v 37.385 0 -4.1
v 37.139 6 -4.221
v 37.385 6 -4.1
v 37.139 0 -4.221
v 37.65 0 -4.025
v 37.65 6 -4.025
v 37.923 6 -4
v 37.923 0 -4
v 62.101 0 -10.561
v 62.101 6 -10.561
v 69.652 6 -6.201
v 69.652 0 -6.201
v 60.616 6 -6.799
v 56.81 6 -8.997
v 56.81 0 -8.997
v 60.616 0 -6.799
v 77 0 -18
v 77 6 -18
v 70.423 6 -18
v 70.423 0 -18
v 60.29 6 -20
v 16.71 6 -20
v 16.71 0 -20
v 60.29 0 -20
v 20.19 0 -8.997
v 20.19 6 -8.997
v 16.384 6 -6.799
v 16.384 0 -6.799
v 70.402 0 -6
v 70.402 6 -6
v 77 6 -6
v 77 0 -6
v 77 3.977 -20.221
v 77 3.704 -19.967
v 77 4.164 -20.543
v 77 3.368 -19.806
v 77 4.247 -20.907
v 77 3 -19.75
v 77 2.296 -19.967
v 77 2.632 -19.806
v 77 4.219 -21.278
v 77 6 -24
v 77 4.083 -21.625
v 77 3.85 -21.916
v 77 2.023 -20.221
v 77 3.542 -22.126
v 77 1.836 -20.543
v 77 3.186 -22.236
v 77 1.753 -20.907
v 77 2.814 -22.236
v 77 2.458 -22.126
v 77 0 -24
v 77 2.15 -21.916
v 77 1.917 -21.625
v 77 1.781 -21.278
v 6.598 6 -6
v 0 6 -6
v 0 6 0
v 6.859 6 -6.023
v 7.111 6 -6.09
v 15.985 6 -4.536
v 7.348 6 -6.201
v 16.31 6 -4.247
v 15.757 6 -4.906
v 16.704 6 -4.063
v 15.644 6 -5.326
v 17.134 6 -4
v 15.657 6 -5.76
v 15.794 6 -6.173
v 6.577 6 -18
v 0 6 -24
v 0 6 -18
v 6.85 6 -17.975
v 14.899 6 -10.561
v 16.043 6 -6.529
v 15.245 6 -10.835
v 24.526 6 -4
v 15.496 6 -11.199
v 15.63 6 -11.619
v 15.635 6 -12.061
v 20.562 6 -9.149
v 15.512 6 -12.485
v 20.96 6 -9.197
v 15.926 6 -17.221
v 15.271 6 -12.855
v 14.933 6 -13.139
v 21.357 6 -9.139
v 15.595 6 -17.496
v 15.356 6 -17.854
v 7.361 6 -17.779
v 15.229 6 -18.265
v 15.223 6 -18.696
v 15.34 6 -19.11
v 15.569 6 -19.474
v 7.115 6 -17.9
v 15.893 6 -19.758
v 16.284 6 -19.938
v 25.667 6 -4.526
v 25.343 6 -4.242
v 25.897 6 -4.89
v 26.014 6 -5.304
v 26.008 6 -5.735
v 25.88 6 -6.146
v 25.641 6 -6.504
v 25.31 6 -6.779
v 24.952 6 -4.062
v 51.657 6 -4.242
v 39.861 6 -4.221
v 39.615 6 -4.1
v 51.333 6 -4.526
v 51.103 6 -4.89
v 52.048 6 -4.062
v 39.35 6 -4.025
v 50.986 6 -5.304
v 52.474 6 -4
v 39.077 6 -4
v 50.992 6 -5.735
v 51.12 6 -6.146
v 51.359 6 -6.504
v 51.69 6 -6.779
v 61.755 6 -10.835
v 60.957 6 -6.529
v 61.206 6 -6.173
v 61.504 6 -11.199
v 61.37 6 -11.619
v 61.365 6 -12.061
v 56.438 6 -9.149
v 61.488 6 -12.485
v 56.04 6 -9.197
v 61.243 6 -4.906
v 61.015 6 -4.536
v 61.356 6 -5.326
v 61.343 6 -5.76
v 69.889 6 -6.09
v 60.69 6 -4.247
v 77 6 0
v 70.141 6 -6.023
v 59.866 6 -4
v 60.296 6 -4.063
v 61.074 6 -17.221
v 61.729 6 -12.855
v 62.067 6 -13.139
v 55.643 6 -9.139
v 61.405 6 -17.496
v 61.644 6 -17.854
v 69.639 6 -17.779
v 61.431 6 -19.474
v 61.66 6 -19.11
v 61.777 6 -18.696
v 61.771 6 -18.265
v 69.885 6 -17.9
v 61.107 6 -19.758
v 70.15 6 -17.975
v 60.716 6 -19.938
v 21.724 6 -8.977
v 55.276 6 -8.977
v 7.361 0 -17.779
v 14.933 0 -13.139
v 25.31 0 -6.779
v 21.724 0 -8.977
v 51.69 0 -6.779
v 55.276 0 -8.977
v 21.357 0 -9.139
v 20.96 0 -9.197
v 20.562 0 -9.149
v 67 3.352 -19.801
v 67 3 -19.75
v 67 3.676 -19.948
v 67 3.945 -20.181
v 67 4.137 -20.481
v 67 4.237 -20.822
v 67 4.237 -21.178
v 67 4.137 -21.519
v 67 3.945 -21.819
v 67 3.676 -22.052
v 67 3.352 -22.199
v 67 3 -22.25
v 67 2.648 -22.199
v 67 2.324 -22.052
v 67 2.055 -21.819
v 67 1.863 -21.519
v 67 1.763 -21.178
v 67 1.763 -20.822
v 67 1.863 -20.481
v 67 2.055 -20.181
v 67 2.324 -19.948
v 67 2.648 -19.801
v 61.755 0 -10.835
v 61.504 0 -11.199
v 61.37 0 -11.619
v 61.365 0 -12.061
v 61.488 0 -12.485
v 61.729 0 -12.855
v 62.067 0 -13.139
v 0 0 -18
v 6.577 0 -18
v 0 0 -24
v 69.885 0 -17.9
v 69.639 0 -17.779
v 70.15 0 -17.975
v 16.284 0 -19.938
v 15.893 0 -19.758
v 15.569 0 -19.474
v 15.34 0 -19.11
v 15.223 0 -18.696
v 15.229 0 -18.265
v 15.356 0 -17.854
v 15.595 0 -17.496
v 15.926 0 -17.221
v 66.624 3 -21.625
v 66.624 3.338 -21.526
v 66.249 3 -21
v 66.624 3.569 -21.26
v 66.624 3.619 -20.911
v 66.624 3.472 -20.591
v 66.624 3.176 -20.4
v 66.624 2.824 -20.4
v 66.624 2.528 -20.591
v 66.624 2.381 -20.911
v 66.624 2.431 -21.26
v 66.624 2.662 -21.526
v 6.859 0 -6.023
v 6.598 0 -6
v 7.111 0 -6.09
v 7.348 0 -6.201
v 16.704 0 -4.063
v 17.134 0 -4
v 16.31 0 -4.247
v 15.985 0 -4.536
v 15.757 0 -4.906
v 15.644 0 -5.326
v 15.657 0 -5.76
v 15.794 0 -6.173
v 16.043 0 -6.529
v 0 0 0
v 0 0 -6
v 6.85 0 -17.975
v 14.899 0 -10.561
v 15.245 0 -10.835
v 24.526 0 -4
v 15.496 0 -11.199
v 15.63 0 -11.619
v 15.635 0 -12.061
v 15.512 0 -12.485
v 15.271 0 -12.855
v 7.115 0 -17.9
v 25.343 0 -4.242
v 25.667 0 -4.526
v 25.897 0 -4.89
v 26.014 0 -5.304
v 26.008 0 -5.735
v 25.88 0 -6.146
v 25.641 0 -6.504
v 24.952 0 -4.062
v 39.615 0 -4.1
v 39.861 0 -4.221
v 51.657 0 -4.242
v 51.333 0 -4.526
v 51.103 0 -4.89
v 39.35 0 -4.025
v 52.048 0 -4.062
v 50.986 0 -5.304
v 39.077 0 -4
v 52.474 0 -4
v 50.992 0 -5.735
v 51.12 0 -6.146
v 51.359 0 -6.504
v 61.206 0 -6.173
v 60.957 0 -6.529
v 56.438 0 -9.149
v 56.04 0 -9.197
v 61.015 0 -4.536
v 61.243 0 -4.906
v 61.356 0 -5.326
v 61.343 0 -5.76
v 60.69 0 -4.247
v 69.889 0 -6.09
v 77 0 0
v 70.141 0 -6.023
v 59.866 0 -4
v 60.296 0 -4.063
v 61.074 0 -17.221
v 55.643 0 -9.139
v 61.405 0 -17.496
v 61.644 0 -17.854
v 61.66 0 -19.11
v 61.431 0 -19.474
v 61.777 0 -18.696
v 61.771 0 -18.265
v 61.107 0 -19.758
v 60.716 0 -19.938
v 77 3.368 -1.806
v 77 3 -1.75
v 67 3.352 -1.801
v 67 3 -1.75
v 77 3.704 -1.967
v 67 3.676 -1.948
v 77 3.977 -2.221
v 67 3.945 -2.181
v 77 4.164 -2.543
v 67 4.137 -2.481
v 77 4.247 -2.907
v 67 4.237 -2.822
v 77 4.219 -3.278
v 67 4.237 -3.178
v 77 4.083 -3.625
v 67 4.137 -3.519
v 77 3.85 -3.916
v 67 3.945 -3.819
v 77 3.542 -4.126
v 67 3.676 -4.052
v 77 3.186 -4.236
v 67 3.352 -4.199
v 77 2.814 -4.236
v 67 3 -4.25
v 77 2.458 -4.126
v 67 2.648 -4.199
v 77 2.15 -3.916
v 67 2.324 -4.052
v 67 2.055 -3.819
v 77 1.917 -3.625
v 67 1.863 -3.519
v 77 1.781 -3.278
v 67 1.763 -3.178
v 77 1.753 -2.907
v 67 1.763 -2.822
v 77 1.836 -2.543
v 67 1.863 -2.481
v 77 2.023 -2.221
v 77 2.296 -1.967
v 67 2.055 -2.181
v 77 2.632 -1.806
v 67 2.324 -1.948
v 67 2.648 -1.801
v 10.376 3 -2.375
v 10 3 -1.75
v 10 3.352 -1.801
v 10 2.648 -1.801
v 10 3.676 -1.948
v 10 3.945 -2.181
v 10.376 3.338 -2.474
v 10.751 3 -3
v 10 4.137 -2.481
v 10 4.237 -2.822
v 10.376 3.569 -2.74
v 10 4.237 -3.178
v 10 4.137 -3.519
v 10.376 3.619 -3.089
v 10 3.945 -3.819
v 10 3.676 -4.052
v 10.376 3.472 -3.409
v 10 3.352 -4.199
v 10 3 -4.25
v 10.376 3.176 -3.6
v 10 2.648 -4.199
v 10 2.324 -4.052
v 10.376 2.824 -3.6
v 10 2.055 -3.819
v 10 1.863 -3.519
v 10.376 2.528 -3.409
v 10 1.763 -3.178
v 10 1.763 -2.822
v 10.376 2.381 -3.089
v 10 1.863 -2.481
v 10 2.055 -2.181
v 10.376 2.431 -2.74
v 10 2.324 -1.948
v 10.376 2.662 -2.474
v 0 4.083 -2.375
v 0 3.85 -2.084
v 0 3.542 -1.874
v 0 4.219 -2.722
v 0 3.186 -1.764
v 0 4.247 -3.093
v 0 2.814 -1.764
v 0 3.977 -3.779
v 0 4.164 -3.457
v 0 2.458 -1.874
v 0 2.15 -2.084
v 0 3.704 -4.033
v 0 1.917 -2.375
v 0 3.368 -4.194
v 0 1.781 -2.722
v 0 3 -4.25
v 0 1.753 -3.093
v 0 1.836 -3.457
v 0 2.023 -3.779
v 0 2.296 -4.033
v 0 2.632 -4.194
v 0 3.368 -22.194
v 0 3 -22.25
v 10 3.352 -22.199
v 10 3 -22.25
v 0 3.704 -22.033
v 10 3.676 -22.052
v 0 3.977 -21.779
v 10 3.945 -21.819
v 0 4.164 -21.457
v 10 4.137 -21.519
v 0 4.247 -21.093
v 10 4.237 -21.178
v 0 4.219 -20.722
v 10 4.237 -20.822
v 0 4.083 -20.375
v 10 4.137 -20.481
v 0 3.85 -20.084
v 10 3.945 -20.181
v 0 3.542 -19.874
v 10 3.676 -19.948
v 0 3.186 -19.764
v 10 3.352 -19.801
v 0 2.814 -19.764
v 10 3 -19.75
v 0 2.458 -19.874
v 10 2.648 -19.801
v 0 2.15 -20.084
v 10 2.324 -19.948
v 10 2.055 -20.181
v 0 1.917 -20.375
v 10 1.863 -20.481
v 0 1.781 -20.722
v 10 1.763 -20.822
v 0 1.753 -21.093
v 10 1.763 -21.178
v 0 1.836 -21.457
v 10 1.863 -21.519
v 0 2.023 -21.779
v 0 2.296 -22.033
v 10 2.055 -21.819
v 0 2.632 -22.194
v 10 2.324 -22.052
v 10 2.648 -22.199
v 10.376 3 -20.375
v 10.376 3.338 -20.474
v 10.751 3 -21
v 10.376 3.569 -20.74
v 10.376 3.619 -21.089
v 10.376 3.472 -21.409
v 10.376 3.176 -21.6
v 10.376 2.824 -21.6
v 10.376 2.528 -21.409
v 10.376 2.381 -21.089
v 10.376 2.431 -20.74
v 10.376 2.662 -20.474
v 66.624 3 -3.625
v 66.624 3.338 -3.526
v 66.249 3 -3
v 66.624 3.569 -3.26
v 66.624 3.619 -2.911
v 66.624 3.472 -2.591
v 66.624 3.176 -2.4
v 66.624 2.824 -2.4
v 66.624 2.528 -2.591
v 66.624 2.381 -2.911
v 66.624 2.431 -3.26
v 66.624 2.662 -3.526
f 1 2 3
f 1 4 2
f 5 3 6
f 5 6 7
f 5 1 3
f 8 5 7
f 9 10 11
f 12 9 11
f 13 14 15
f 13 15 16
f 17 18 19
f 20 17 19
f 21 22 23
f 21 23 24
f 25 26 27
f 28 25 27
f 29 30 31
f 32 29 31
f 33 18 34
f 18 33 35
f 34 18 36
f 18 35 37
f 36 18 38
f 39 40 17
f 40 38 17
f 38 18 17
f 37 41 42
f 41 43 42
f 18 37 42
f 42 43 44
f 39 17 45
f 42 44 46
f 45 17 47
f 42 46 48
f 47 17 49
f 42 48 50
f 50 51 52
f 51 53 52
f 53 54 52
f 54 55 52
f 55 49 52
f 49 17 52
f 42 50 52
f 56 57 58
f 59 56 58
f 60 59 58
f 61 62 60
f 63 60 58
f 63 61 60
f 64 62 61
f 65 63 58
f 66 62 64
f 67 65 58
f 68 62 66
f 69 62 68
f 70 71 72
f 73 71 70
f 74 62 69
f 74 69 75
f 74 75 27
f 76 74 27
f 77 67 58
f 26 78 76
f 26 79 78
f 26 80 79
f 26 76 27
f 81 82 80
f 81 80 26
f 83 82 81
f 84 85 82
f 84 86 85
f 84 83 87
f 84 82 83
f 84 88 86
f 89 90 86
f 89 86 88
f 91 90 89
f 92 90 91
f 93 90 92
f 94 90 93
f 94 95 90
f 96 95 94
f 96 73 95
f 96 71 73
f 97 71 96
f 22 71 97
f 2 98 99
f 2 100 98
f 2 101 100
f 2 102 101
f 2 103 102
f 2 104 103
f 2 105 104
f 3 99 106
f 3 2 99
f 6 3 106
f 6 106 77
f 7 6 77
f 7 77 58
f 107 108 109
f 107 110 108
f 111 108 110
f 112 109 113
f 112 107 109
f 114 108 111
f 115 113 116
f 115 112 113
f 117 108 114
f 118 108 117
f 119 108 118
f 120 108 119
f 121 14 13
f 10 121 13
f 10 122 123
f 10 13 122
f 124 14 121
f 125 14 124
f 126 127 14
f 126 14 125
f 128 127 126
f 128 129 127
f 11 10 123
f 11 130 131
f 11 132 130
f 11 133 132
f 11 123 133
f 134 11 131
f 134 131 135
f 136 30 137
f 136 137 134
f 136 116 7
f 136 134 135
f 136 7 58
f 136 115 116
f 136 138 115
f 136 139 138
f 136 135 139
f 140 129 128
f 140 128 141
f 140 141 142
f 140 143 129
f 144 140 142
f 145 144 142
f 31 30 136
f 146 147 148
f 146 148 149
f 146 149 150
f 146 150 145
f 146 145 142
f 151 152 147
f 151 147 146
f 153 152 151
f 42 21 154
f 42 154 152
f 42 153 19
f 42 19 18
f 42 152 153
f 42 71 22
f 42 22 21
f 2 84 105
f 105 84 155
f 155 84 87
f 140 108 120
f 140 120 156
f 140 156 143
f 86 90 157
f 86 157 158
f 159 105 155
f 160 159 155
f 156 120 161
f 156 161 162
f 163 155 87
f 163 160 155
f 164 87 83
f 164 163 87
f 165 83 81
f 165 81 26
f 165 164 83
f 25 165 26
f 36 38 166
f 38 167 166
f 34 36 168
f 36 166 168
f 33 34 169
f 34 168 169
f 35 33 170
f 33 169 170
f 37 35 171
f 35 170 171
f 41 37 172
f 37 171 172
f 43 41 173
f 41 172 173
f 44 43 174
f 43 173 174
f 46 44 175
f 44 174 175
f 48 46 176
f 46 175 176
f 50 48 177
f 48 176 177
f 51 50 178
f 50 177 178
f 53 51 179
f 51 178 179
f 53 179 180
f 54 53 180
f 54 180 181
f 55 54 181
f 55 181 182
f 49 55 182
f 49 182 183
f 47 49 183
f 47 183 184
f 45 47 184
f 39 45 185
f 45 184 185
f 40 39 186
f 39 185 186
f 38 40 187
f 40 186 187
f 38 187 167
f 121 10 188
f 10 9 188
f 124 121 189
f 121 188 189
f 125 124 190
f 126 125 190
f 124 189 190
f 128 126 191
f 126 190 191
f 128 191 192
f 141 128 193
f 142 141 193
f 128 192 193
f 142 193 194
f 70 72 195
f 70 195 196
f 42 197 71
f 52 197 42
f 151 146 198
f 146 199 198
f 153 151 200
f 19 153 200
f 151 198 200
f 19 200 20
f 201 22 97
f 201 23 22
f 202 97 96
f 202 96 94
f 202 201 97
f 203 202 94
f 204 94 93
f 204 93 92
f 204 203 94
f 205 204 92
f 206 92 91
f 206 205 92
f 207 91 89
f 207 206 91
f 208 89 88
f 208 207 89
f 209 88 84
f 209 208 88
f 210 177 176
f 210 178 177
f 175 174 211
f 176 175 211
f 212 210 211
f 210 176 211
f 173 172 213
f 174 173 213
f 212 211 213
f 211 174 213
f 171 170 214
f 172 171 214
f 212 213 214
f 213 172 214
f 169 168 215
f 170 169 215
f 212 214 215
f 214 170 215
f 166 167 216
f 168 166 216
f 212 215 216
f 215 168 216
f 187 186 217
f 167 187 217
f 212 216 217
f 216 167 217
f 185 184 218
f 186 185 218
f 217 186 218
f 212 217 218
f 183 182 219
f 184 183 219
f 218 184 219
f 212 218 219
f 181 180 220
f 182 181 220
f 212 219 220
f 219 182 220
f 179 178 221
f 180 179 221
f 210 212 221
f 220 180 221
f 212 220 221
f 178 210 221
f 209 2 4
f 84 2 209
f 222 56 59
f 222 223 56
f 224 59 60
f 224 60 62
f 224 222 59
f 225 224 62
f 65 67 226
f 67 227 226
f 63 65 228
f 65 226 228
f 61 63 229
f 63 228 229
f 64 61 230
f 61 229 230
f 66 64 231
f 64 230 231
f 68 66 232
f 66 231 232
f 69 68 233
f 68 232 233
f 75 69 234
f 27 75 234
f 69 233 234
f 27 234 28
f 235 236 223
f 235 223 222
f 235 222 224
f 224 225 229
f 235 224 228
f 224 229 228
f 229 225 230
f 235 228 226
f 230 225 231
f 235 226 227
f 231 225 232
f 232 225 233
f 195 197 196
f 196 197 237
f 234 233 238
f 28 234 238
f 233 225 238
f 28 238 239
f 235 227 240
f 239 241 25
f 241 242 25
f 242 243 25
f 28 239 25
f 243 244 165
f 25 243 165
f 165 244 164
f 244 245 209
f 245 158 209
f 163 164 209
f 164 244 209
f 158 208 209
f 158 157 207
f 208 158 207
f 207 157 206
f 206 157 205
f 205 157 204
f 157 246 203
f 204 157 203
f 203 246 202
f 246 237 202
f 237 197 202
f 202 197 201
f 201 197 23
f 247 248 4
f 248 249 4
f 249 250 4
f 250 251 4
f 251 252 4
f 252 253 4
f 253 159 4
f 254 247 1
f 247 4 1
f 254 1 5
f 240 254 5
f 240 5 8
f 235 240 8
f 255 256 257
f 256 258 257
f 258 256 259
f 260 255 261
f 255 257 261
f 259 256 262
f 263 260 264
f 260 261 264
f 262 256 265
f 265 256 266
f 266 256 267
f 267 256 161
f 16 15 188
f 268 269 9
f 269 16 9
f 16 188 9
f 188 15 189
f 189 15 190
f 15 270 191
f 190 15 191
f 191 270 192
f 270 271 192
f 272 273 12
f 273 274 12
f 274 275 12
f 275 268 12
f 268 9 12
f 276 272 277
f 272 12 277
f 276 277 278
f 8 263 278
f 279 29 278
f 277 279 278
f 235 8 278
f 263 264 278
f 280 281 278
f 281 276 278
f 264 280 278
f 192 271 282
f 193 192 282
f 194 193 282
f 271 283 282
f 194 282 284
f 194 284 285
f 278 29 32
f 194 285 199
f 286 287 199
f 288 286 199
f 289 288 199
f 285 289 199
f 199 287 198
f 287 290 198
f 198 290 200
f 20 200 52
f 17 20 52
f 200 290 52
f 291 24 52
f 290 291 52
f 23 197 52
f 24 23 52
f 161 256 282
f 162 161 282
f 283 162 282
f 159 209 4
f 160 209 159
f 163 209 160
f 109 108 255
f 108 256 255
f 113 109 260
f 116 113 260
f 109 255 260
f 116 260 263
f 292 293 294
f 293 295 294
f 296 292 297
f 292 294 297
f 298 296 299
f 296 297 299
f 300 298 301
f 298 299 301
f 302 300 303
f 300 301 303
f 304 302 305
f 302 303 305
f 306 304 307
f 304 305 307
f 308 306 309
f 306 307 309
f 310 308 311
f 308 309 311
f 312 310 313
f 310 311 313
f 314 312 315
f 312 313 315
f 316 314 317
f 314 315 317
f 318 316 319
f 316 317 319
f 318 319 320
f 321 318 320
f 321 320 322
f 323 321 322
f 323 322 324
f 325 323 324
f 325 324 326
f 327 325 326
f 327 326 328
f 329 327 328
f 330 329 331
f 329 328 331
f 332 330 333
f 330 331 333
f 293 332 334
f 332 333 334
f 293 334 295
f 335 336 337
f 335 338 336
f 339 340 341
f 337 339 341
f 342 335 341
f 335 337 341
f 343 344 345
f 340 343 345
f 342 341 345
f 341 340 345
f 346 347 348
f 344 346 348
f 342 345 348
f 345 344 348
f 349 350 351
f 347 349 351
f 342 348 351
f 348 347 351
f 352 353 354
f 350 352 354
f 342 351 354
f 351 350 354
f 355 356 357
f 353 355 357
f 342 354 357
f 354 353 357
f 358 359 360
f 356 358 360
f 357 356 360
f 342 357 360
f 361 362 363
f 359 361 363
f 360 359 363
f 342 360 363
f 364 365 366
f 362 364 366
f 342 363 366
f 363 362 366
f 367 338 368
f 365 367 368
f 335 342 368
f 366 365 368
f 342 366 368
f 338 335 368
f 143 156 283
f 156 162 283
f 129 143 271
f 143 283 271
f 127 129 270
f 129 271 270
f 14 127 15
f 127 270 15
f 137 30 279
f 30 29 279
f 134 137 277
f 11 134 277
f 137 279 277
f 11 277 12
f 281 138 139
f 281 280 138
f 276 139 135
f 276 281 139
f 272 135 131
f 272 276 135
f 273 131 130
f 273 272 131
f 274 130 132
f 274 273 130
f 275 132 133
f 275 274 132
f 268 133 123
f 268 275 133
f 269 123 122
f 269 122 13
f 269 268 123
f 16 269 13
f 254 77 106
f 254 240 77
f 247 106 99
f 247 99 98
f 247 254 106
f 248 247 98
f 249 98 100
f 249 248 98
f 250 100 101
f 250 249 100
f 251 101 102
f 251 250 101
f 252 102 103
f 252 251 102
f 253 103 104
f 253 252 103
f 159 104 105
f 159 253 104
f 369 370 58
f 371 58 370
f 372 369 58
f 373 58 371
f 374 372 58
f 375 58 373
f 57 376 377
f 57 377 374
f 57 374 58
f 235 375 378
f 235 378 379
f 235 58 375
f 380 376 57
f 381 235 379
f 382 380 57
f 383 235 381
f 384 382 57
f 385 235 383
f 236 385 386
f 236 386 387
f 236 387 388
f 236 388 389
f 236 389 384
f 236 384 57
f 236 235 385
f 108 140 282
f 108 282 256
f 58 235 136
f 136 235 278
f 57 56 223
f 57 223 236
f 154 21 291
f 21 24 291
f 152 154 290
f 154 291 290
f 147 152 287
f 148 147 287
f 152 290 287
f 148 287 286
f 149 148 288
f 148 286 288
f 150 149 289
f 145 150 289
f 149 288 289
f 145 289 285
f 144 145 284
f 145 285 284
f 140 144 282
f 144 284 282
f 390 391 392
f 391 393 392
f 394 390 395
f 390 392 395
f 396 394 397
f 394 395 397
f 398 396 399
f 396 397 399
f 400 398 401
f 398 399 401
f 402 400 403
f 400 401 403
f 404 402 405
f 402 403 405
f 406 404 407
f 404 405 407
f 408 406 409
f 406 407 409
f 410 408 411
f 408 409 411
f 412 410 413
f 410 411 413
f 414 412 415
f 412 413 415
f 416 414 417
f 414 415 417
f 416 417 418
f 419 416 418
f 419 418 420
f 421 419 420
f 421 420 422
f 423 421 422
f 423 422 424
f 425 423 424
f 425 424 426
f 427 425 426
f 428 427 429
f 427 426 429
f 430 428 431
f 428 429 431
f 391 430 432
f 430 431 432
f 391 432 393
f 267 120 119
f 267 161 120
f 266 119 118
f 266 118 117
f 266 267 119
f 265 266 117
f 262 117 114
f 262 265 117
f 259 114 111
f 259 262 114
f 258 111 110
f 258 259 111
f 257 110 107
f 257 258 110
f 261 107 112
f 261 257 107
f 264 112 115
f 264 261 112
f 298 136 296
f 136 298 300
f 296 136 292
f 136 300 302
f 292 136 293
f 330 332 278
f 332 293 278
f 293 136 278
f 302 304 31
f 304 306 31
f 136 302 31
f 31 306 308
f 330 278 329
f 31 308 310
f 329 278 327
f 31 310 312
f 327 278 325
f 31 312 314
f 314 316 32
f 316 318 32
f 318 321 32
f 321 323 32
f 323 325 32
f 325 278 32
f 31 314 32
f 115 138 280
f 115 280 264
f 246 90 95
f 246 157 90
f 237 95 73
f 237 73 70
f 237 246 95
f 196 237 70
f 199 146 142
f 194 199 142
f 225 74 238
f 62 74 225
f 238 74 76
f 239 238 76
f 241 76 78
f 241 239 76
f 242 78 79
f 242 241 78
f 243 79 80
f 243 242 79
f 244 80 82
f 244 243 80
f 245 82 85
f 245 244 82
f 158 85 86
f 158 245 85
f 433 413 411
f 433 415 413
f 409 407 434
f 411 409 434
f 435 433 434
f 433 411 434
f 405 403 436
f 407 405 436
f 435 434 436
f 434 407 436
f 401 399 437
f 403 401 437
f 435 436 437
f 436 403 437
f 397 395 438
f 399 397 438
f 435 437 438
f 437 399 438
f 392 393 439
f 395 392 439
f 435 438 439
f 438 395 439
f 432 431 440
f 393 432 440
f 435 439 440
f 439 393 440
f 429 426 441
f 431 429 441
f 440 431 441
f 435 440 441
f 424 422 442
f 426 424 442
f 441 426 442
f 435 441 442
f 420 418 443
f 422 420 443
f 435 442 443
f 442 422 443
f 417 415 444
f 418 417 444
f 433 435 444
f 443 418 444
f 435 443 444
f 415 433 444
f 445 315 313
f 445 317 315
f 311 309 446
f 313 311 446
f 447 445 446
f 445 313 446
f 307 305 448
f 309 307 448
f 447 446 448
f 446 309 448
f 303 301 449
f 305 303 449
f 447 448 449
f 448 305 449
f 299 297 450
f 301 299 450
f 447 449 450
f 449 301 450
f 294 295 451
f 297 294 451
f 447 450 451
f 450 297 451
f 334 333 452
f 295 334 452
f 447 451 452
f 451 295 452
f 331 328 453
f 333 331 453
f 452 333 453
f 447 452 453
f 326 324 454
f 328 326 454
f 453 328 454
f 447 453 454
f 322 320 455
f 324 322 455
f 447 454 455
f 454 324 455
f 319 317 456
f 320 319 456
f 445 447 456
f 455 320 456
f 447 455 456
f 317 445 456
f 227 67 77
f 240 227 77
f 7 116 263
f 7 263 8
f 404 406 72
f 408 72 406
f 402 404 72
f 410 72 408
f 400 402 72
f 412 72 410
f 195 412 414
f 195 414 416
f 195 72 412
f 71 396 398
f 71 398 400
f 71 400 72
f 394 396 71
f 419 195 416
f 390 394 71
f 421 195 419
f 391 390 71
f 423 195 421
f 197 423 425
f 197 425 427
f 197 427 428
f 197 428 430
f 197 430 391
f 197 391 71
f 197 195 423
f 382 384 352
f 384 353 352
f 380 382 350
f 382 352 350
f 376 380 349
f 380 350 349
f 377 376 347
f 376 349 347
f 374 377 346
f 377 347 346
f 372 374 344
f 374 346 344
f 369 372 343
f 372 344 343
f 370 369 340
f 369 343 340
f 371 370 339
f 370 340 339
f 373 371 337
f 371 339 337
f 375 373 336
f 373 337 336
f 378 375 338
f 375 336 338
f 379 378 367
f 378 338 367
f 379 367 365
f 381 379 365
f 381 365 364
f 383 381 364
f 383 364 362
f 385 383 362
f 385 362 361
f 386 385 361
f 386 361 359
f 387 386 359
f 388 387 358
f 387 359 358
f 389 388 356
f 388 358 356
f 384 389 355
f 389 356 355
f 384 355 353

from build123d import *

# Parameters (mm, degrees)
SKETCH1_W                   = 77
SKETCH1_H                   = 24
BOSS_EXTRUDE1_DEPTH         = 6
CUT_EXTRUDE1_REACH          = 8
TAP_DRILL_FOR_M3_TAP1_D     = 2.5
TAP_DRILL_FOR_M3_TAP1_DEPTH = 10
TAP_DRILL_FOR_M3_TAP1_TIP   = 0.751075774
TAP_DRILL_FOR_M3_TAP2_D     = 2.5
TAP_DRILL_FOR_M3_TAP2_DEPTH = 10
TAP_DRILL_FOR_M3_TAP2_TIP   = 0.751075774
FILLET1_R                   = 1.5


with BuildPart() as part:
    # Sketch1 → Boss-Extrude1 (new body)
    with BuildSketch(Plane(origin=(0, 0, 0), x_dir=(1, 0, 0), z_dir=(0, 1, 0))):
        with Locations((38.5, 12)):
            Rectangle(SKETCH1_W, SKETCH1_H)
    extrude(amount=BOSS_EXTRUDE1_DEPTH)

    # Sketch2 → Cut-Extrude1 (cut, up to next)
    with BuildSketch(Plane(origin=(0, 6, 0), x_dir=(1, 0, 0), z_dir=(0, 1, 0)), mode=Mode.PRIVATE) as cut_extrude1_sk1:
        Polygon((0, 18), (7, 18), (17.082489299, 11.821127911), (7, 6), (0, 6), align=None)
    cut_extrude1_tool1 = extrude(cut_extrude1_sk1.sketch, amount=-CUT_EXTRUDE1_REACH, mode=Mode.PRIVATE) & part.part
    add(cut_extrude1_tool1.solids().sort_by_distance((6.372388, 6, -11.975038))[0], mode=Mode.SUBTRACT)
    # Sketch2 → Cut-Extrude1 (cut, up to next)
    with BuildSketch(Plane(origin=(0, 6, 0), x_dir=(1, 0, 0), z_dir=(0, 1, 0)), mode=Mode.PRIVATE) as cut_extrude1_sk2:
        Polygon((11.391702814, 20), (65.608297186, 20), (39.5, 4), (37.5, 4), align=None)
    cut_extrude1_tool2 = extrude(cut_extrude1_sk2.sketch, amount=-CUT_EXTRUDE1_REACH, mode=Mode.PRIVATE) & part.part
    add(cut_extrude1_tool2.solids().sort_by_distance((38.5, 6, -14.476924))[0], mode=Mode.SUBTRACT)
    # Sketch2 → Cut-Extrude1 (cut, up to next)
    with BuildSketch(Plane(origin=(0, 6, 0), x_dir=(1, 0, 0), z_dir=(0, 1, 0)), mode=Mode.PRIVATE) as cut_extrude1_sk3:
        Polygon((77, 18), (70, 18), (59.917510701, 11.821127911), (70, 6), (77, 6), align=None)
    cut_extrude1_tool3 = extrude(cut_extrude1_sk3.sketch, amount=-CUT_EXTRUDE1_REACH, mode=Mode.PRIVATE) & part.part
    add(cut_extrude1_tool3.solids().sort_by_distance((70.627612, 6, -11.975038))[0], mode=Mode.SUBTRACT)
    # Sketch2 → Cut-Extrude1 (cut, up to next)
    with BuildSketch(Plane(origin=(0, 6, 0), x_dir=(1, 0, 0), z_dir=(0, 1, 0)), mode=Mode.PRIVATE) as cut_extrude1_sk4:
        Polygon((20.963241239, 9.442878935), (11.535898385, 4), (29.844760038, 4), align=None)
    cut_extrude1_tool4 = extrude(cut_extrude1_sk4.sketch, amount=-CUT_EXTRUDE1_REACH, mode=Mode.PRIVATE) & part.part
    add(cut_extrude1_tool4.solids().sort_by_distance((20.7813, 6, -5.814293))[0], mode=Mode.SUBTRACT)
    # Sketch2 → Cut-Extrude1 (cut, up to next)
    with BuildSketch(Plane(origin=(0, 6, 0), x_dir=(1, 0, 0), z_dir=(0, 1, 0)), mode=Mode.PRIVATE) as cut_extrude1_sk5:
        Polygon((47.155239962, 4), (56.036758761, 9.442878935), (65.464101615, 4), align=None)
    cut_extrude1_tool5 = extrude(cut_extrude1_sk5.sketch, amount=-CUT_EXTRUDE1_REACH, mode=Mode.PRIVATE) & part.part
    add(cut_extrude1_tool5.solids().sort_by_distance((56.2187, 6, -5.814293))[0], mode=Mode.SUBTRACT)

    # Tap Drill for M3 Tap1
    with Locations(Plane.ZY):
        with Locations((-21, 3), (-3, 3)):
            Hole(TAP_DRILL_FOR_M3_TAP1_D / 2, depth=TAP_DRILL_FOR_M3_TAP1_DEPTH)
            with Locations((0, 0, -(TAP_DRILL_FOR_M3_TAP1_DEPTH + TAP_DRILL_FOR_M3_TAP1_TIP / 2))):  # 118° drill point
                Cone(0, TAP_DRILL_FOR_M3_TAP1_D / 2, TAP_DRILL_FOR_M3_TAP1_TIP, mode=Mode.SUBTRACT)

    # Tap Drill for M3 Tap2
    with Locations(Plane(origin=(77, 0, 0), x_dir=(0, 0, -1), z_dir=(1, 0, 0))):
        with Locations((3, 3), (21, 3)):
            Hole(TAP_DRILL_FOR_M3_TAP2_D / 2, depth=TAP_DRILL_FOR_M3_TAP2_DEPTH)
            with Locations((0, 0, -(TAP_DRILL_FOR_M3_TAP2_DEPTH + TAP_DRILL_FOR_M3_TAP2_TIP / 2))):  # 118° drill point
                Cone(0, TAP_DRILL_FOR_M3_TAP2_D / 2, TAP_DRILL_FOR_M3_TAP2_TIP, mode=Mode.SUBTRACT)

    # Fillet1
    fillet1_edges = [part.edges().sort_by_distance(p)[0] for p in [
        (7, 3, -18),
        (17.082489299, 3, -11.821127911),
        (7, 3, -6),
        (70, 3, -6),
        (59.917510701, 3, -11.821127911),
        (70, 3, -18),
        (37.5, 3, -4),
        (11.391702814, 3, -20),
        (65.608297186, 3, -20),
        (39.5, 3, -4),
        (20.963241239, 3, -9.442878935),
        (29.844760038, 3, -4),
        (11.535898385, 3, -4),
        (65.464101615, 3, -4),
        (47.155239962, 3, -4),
        (56.036758761, 3, -9.442878935),
    ]]
    fillet(fillet1_edges, radius=FILLET1_R)


solid = part.part
